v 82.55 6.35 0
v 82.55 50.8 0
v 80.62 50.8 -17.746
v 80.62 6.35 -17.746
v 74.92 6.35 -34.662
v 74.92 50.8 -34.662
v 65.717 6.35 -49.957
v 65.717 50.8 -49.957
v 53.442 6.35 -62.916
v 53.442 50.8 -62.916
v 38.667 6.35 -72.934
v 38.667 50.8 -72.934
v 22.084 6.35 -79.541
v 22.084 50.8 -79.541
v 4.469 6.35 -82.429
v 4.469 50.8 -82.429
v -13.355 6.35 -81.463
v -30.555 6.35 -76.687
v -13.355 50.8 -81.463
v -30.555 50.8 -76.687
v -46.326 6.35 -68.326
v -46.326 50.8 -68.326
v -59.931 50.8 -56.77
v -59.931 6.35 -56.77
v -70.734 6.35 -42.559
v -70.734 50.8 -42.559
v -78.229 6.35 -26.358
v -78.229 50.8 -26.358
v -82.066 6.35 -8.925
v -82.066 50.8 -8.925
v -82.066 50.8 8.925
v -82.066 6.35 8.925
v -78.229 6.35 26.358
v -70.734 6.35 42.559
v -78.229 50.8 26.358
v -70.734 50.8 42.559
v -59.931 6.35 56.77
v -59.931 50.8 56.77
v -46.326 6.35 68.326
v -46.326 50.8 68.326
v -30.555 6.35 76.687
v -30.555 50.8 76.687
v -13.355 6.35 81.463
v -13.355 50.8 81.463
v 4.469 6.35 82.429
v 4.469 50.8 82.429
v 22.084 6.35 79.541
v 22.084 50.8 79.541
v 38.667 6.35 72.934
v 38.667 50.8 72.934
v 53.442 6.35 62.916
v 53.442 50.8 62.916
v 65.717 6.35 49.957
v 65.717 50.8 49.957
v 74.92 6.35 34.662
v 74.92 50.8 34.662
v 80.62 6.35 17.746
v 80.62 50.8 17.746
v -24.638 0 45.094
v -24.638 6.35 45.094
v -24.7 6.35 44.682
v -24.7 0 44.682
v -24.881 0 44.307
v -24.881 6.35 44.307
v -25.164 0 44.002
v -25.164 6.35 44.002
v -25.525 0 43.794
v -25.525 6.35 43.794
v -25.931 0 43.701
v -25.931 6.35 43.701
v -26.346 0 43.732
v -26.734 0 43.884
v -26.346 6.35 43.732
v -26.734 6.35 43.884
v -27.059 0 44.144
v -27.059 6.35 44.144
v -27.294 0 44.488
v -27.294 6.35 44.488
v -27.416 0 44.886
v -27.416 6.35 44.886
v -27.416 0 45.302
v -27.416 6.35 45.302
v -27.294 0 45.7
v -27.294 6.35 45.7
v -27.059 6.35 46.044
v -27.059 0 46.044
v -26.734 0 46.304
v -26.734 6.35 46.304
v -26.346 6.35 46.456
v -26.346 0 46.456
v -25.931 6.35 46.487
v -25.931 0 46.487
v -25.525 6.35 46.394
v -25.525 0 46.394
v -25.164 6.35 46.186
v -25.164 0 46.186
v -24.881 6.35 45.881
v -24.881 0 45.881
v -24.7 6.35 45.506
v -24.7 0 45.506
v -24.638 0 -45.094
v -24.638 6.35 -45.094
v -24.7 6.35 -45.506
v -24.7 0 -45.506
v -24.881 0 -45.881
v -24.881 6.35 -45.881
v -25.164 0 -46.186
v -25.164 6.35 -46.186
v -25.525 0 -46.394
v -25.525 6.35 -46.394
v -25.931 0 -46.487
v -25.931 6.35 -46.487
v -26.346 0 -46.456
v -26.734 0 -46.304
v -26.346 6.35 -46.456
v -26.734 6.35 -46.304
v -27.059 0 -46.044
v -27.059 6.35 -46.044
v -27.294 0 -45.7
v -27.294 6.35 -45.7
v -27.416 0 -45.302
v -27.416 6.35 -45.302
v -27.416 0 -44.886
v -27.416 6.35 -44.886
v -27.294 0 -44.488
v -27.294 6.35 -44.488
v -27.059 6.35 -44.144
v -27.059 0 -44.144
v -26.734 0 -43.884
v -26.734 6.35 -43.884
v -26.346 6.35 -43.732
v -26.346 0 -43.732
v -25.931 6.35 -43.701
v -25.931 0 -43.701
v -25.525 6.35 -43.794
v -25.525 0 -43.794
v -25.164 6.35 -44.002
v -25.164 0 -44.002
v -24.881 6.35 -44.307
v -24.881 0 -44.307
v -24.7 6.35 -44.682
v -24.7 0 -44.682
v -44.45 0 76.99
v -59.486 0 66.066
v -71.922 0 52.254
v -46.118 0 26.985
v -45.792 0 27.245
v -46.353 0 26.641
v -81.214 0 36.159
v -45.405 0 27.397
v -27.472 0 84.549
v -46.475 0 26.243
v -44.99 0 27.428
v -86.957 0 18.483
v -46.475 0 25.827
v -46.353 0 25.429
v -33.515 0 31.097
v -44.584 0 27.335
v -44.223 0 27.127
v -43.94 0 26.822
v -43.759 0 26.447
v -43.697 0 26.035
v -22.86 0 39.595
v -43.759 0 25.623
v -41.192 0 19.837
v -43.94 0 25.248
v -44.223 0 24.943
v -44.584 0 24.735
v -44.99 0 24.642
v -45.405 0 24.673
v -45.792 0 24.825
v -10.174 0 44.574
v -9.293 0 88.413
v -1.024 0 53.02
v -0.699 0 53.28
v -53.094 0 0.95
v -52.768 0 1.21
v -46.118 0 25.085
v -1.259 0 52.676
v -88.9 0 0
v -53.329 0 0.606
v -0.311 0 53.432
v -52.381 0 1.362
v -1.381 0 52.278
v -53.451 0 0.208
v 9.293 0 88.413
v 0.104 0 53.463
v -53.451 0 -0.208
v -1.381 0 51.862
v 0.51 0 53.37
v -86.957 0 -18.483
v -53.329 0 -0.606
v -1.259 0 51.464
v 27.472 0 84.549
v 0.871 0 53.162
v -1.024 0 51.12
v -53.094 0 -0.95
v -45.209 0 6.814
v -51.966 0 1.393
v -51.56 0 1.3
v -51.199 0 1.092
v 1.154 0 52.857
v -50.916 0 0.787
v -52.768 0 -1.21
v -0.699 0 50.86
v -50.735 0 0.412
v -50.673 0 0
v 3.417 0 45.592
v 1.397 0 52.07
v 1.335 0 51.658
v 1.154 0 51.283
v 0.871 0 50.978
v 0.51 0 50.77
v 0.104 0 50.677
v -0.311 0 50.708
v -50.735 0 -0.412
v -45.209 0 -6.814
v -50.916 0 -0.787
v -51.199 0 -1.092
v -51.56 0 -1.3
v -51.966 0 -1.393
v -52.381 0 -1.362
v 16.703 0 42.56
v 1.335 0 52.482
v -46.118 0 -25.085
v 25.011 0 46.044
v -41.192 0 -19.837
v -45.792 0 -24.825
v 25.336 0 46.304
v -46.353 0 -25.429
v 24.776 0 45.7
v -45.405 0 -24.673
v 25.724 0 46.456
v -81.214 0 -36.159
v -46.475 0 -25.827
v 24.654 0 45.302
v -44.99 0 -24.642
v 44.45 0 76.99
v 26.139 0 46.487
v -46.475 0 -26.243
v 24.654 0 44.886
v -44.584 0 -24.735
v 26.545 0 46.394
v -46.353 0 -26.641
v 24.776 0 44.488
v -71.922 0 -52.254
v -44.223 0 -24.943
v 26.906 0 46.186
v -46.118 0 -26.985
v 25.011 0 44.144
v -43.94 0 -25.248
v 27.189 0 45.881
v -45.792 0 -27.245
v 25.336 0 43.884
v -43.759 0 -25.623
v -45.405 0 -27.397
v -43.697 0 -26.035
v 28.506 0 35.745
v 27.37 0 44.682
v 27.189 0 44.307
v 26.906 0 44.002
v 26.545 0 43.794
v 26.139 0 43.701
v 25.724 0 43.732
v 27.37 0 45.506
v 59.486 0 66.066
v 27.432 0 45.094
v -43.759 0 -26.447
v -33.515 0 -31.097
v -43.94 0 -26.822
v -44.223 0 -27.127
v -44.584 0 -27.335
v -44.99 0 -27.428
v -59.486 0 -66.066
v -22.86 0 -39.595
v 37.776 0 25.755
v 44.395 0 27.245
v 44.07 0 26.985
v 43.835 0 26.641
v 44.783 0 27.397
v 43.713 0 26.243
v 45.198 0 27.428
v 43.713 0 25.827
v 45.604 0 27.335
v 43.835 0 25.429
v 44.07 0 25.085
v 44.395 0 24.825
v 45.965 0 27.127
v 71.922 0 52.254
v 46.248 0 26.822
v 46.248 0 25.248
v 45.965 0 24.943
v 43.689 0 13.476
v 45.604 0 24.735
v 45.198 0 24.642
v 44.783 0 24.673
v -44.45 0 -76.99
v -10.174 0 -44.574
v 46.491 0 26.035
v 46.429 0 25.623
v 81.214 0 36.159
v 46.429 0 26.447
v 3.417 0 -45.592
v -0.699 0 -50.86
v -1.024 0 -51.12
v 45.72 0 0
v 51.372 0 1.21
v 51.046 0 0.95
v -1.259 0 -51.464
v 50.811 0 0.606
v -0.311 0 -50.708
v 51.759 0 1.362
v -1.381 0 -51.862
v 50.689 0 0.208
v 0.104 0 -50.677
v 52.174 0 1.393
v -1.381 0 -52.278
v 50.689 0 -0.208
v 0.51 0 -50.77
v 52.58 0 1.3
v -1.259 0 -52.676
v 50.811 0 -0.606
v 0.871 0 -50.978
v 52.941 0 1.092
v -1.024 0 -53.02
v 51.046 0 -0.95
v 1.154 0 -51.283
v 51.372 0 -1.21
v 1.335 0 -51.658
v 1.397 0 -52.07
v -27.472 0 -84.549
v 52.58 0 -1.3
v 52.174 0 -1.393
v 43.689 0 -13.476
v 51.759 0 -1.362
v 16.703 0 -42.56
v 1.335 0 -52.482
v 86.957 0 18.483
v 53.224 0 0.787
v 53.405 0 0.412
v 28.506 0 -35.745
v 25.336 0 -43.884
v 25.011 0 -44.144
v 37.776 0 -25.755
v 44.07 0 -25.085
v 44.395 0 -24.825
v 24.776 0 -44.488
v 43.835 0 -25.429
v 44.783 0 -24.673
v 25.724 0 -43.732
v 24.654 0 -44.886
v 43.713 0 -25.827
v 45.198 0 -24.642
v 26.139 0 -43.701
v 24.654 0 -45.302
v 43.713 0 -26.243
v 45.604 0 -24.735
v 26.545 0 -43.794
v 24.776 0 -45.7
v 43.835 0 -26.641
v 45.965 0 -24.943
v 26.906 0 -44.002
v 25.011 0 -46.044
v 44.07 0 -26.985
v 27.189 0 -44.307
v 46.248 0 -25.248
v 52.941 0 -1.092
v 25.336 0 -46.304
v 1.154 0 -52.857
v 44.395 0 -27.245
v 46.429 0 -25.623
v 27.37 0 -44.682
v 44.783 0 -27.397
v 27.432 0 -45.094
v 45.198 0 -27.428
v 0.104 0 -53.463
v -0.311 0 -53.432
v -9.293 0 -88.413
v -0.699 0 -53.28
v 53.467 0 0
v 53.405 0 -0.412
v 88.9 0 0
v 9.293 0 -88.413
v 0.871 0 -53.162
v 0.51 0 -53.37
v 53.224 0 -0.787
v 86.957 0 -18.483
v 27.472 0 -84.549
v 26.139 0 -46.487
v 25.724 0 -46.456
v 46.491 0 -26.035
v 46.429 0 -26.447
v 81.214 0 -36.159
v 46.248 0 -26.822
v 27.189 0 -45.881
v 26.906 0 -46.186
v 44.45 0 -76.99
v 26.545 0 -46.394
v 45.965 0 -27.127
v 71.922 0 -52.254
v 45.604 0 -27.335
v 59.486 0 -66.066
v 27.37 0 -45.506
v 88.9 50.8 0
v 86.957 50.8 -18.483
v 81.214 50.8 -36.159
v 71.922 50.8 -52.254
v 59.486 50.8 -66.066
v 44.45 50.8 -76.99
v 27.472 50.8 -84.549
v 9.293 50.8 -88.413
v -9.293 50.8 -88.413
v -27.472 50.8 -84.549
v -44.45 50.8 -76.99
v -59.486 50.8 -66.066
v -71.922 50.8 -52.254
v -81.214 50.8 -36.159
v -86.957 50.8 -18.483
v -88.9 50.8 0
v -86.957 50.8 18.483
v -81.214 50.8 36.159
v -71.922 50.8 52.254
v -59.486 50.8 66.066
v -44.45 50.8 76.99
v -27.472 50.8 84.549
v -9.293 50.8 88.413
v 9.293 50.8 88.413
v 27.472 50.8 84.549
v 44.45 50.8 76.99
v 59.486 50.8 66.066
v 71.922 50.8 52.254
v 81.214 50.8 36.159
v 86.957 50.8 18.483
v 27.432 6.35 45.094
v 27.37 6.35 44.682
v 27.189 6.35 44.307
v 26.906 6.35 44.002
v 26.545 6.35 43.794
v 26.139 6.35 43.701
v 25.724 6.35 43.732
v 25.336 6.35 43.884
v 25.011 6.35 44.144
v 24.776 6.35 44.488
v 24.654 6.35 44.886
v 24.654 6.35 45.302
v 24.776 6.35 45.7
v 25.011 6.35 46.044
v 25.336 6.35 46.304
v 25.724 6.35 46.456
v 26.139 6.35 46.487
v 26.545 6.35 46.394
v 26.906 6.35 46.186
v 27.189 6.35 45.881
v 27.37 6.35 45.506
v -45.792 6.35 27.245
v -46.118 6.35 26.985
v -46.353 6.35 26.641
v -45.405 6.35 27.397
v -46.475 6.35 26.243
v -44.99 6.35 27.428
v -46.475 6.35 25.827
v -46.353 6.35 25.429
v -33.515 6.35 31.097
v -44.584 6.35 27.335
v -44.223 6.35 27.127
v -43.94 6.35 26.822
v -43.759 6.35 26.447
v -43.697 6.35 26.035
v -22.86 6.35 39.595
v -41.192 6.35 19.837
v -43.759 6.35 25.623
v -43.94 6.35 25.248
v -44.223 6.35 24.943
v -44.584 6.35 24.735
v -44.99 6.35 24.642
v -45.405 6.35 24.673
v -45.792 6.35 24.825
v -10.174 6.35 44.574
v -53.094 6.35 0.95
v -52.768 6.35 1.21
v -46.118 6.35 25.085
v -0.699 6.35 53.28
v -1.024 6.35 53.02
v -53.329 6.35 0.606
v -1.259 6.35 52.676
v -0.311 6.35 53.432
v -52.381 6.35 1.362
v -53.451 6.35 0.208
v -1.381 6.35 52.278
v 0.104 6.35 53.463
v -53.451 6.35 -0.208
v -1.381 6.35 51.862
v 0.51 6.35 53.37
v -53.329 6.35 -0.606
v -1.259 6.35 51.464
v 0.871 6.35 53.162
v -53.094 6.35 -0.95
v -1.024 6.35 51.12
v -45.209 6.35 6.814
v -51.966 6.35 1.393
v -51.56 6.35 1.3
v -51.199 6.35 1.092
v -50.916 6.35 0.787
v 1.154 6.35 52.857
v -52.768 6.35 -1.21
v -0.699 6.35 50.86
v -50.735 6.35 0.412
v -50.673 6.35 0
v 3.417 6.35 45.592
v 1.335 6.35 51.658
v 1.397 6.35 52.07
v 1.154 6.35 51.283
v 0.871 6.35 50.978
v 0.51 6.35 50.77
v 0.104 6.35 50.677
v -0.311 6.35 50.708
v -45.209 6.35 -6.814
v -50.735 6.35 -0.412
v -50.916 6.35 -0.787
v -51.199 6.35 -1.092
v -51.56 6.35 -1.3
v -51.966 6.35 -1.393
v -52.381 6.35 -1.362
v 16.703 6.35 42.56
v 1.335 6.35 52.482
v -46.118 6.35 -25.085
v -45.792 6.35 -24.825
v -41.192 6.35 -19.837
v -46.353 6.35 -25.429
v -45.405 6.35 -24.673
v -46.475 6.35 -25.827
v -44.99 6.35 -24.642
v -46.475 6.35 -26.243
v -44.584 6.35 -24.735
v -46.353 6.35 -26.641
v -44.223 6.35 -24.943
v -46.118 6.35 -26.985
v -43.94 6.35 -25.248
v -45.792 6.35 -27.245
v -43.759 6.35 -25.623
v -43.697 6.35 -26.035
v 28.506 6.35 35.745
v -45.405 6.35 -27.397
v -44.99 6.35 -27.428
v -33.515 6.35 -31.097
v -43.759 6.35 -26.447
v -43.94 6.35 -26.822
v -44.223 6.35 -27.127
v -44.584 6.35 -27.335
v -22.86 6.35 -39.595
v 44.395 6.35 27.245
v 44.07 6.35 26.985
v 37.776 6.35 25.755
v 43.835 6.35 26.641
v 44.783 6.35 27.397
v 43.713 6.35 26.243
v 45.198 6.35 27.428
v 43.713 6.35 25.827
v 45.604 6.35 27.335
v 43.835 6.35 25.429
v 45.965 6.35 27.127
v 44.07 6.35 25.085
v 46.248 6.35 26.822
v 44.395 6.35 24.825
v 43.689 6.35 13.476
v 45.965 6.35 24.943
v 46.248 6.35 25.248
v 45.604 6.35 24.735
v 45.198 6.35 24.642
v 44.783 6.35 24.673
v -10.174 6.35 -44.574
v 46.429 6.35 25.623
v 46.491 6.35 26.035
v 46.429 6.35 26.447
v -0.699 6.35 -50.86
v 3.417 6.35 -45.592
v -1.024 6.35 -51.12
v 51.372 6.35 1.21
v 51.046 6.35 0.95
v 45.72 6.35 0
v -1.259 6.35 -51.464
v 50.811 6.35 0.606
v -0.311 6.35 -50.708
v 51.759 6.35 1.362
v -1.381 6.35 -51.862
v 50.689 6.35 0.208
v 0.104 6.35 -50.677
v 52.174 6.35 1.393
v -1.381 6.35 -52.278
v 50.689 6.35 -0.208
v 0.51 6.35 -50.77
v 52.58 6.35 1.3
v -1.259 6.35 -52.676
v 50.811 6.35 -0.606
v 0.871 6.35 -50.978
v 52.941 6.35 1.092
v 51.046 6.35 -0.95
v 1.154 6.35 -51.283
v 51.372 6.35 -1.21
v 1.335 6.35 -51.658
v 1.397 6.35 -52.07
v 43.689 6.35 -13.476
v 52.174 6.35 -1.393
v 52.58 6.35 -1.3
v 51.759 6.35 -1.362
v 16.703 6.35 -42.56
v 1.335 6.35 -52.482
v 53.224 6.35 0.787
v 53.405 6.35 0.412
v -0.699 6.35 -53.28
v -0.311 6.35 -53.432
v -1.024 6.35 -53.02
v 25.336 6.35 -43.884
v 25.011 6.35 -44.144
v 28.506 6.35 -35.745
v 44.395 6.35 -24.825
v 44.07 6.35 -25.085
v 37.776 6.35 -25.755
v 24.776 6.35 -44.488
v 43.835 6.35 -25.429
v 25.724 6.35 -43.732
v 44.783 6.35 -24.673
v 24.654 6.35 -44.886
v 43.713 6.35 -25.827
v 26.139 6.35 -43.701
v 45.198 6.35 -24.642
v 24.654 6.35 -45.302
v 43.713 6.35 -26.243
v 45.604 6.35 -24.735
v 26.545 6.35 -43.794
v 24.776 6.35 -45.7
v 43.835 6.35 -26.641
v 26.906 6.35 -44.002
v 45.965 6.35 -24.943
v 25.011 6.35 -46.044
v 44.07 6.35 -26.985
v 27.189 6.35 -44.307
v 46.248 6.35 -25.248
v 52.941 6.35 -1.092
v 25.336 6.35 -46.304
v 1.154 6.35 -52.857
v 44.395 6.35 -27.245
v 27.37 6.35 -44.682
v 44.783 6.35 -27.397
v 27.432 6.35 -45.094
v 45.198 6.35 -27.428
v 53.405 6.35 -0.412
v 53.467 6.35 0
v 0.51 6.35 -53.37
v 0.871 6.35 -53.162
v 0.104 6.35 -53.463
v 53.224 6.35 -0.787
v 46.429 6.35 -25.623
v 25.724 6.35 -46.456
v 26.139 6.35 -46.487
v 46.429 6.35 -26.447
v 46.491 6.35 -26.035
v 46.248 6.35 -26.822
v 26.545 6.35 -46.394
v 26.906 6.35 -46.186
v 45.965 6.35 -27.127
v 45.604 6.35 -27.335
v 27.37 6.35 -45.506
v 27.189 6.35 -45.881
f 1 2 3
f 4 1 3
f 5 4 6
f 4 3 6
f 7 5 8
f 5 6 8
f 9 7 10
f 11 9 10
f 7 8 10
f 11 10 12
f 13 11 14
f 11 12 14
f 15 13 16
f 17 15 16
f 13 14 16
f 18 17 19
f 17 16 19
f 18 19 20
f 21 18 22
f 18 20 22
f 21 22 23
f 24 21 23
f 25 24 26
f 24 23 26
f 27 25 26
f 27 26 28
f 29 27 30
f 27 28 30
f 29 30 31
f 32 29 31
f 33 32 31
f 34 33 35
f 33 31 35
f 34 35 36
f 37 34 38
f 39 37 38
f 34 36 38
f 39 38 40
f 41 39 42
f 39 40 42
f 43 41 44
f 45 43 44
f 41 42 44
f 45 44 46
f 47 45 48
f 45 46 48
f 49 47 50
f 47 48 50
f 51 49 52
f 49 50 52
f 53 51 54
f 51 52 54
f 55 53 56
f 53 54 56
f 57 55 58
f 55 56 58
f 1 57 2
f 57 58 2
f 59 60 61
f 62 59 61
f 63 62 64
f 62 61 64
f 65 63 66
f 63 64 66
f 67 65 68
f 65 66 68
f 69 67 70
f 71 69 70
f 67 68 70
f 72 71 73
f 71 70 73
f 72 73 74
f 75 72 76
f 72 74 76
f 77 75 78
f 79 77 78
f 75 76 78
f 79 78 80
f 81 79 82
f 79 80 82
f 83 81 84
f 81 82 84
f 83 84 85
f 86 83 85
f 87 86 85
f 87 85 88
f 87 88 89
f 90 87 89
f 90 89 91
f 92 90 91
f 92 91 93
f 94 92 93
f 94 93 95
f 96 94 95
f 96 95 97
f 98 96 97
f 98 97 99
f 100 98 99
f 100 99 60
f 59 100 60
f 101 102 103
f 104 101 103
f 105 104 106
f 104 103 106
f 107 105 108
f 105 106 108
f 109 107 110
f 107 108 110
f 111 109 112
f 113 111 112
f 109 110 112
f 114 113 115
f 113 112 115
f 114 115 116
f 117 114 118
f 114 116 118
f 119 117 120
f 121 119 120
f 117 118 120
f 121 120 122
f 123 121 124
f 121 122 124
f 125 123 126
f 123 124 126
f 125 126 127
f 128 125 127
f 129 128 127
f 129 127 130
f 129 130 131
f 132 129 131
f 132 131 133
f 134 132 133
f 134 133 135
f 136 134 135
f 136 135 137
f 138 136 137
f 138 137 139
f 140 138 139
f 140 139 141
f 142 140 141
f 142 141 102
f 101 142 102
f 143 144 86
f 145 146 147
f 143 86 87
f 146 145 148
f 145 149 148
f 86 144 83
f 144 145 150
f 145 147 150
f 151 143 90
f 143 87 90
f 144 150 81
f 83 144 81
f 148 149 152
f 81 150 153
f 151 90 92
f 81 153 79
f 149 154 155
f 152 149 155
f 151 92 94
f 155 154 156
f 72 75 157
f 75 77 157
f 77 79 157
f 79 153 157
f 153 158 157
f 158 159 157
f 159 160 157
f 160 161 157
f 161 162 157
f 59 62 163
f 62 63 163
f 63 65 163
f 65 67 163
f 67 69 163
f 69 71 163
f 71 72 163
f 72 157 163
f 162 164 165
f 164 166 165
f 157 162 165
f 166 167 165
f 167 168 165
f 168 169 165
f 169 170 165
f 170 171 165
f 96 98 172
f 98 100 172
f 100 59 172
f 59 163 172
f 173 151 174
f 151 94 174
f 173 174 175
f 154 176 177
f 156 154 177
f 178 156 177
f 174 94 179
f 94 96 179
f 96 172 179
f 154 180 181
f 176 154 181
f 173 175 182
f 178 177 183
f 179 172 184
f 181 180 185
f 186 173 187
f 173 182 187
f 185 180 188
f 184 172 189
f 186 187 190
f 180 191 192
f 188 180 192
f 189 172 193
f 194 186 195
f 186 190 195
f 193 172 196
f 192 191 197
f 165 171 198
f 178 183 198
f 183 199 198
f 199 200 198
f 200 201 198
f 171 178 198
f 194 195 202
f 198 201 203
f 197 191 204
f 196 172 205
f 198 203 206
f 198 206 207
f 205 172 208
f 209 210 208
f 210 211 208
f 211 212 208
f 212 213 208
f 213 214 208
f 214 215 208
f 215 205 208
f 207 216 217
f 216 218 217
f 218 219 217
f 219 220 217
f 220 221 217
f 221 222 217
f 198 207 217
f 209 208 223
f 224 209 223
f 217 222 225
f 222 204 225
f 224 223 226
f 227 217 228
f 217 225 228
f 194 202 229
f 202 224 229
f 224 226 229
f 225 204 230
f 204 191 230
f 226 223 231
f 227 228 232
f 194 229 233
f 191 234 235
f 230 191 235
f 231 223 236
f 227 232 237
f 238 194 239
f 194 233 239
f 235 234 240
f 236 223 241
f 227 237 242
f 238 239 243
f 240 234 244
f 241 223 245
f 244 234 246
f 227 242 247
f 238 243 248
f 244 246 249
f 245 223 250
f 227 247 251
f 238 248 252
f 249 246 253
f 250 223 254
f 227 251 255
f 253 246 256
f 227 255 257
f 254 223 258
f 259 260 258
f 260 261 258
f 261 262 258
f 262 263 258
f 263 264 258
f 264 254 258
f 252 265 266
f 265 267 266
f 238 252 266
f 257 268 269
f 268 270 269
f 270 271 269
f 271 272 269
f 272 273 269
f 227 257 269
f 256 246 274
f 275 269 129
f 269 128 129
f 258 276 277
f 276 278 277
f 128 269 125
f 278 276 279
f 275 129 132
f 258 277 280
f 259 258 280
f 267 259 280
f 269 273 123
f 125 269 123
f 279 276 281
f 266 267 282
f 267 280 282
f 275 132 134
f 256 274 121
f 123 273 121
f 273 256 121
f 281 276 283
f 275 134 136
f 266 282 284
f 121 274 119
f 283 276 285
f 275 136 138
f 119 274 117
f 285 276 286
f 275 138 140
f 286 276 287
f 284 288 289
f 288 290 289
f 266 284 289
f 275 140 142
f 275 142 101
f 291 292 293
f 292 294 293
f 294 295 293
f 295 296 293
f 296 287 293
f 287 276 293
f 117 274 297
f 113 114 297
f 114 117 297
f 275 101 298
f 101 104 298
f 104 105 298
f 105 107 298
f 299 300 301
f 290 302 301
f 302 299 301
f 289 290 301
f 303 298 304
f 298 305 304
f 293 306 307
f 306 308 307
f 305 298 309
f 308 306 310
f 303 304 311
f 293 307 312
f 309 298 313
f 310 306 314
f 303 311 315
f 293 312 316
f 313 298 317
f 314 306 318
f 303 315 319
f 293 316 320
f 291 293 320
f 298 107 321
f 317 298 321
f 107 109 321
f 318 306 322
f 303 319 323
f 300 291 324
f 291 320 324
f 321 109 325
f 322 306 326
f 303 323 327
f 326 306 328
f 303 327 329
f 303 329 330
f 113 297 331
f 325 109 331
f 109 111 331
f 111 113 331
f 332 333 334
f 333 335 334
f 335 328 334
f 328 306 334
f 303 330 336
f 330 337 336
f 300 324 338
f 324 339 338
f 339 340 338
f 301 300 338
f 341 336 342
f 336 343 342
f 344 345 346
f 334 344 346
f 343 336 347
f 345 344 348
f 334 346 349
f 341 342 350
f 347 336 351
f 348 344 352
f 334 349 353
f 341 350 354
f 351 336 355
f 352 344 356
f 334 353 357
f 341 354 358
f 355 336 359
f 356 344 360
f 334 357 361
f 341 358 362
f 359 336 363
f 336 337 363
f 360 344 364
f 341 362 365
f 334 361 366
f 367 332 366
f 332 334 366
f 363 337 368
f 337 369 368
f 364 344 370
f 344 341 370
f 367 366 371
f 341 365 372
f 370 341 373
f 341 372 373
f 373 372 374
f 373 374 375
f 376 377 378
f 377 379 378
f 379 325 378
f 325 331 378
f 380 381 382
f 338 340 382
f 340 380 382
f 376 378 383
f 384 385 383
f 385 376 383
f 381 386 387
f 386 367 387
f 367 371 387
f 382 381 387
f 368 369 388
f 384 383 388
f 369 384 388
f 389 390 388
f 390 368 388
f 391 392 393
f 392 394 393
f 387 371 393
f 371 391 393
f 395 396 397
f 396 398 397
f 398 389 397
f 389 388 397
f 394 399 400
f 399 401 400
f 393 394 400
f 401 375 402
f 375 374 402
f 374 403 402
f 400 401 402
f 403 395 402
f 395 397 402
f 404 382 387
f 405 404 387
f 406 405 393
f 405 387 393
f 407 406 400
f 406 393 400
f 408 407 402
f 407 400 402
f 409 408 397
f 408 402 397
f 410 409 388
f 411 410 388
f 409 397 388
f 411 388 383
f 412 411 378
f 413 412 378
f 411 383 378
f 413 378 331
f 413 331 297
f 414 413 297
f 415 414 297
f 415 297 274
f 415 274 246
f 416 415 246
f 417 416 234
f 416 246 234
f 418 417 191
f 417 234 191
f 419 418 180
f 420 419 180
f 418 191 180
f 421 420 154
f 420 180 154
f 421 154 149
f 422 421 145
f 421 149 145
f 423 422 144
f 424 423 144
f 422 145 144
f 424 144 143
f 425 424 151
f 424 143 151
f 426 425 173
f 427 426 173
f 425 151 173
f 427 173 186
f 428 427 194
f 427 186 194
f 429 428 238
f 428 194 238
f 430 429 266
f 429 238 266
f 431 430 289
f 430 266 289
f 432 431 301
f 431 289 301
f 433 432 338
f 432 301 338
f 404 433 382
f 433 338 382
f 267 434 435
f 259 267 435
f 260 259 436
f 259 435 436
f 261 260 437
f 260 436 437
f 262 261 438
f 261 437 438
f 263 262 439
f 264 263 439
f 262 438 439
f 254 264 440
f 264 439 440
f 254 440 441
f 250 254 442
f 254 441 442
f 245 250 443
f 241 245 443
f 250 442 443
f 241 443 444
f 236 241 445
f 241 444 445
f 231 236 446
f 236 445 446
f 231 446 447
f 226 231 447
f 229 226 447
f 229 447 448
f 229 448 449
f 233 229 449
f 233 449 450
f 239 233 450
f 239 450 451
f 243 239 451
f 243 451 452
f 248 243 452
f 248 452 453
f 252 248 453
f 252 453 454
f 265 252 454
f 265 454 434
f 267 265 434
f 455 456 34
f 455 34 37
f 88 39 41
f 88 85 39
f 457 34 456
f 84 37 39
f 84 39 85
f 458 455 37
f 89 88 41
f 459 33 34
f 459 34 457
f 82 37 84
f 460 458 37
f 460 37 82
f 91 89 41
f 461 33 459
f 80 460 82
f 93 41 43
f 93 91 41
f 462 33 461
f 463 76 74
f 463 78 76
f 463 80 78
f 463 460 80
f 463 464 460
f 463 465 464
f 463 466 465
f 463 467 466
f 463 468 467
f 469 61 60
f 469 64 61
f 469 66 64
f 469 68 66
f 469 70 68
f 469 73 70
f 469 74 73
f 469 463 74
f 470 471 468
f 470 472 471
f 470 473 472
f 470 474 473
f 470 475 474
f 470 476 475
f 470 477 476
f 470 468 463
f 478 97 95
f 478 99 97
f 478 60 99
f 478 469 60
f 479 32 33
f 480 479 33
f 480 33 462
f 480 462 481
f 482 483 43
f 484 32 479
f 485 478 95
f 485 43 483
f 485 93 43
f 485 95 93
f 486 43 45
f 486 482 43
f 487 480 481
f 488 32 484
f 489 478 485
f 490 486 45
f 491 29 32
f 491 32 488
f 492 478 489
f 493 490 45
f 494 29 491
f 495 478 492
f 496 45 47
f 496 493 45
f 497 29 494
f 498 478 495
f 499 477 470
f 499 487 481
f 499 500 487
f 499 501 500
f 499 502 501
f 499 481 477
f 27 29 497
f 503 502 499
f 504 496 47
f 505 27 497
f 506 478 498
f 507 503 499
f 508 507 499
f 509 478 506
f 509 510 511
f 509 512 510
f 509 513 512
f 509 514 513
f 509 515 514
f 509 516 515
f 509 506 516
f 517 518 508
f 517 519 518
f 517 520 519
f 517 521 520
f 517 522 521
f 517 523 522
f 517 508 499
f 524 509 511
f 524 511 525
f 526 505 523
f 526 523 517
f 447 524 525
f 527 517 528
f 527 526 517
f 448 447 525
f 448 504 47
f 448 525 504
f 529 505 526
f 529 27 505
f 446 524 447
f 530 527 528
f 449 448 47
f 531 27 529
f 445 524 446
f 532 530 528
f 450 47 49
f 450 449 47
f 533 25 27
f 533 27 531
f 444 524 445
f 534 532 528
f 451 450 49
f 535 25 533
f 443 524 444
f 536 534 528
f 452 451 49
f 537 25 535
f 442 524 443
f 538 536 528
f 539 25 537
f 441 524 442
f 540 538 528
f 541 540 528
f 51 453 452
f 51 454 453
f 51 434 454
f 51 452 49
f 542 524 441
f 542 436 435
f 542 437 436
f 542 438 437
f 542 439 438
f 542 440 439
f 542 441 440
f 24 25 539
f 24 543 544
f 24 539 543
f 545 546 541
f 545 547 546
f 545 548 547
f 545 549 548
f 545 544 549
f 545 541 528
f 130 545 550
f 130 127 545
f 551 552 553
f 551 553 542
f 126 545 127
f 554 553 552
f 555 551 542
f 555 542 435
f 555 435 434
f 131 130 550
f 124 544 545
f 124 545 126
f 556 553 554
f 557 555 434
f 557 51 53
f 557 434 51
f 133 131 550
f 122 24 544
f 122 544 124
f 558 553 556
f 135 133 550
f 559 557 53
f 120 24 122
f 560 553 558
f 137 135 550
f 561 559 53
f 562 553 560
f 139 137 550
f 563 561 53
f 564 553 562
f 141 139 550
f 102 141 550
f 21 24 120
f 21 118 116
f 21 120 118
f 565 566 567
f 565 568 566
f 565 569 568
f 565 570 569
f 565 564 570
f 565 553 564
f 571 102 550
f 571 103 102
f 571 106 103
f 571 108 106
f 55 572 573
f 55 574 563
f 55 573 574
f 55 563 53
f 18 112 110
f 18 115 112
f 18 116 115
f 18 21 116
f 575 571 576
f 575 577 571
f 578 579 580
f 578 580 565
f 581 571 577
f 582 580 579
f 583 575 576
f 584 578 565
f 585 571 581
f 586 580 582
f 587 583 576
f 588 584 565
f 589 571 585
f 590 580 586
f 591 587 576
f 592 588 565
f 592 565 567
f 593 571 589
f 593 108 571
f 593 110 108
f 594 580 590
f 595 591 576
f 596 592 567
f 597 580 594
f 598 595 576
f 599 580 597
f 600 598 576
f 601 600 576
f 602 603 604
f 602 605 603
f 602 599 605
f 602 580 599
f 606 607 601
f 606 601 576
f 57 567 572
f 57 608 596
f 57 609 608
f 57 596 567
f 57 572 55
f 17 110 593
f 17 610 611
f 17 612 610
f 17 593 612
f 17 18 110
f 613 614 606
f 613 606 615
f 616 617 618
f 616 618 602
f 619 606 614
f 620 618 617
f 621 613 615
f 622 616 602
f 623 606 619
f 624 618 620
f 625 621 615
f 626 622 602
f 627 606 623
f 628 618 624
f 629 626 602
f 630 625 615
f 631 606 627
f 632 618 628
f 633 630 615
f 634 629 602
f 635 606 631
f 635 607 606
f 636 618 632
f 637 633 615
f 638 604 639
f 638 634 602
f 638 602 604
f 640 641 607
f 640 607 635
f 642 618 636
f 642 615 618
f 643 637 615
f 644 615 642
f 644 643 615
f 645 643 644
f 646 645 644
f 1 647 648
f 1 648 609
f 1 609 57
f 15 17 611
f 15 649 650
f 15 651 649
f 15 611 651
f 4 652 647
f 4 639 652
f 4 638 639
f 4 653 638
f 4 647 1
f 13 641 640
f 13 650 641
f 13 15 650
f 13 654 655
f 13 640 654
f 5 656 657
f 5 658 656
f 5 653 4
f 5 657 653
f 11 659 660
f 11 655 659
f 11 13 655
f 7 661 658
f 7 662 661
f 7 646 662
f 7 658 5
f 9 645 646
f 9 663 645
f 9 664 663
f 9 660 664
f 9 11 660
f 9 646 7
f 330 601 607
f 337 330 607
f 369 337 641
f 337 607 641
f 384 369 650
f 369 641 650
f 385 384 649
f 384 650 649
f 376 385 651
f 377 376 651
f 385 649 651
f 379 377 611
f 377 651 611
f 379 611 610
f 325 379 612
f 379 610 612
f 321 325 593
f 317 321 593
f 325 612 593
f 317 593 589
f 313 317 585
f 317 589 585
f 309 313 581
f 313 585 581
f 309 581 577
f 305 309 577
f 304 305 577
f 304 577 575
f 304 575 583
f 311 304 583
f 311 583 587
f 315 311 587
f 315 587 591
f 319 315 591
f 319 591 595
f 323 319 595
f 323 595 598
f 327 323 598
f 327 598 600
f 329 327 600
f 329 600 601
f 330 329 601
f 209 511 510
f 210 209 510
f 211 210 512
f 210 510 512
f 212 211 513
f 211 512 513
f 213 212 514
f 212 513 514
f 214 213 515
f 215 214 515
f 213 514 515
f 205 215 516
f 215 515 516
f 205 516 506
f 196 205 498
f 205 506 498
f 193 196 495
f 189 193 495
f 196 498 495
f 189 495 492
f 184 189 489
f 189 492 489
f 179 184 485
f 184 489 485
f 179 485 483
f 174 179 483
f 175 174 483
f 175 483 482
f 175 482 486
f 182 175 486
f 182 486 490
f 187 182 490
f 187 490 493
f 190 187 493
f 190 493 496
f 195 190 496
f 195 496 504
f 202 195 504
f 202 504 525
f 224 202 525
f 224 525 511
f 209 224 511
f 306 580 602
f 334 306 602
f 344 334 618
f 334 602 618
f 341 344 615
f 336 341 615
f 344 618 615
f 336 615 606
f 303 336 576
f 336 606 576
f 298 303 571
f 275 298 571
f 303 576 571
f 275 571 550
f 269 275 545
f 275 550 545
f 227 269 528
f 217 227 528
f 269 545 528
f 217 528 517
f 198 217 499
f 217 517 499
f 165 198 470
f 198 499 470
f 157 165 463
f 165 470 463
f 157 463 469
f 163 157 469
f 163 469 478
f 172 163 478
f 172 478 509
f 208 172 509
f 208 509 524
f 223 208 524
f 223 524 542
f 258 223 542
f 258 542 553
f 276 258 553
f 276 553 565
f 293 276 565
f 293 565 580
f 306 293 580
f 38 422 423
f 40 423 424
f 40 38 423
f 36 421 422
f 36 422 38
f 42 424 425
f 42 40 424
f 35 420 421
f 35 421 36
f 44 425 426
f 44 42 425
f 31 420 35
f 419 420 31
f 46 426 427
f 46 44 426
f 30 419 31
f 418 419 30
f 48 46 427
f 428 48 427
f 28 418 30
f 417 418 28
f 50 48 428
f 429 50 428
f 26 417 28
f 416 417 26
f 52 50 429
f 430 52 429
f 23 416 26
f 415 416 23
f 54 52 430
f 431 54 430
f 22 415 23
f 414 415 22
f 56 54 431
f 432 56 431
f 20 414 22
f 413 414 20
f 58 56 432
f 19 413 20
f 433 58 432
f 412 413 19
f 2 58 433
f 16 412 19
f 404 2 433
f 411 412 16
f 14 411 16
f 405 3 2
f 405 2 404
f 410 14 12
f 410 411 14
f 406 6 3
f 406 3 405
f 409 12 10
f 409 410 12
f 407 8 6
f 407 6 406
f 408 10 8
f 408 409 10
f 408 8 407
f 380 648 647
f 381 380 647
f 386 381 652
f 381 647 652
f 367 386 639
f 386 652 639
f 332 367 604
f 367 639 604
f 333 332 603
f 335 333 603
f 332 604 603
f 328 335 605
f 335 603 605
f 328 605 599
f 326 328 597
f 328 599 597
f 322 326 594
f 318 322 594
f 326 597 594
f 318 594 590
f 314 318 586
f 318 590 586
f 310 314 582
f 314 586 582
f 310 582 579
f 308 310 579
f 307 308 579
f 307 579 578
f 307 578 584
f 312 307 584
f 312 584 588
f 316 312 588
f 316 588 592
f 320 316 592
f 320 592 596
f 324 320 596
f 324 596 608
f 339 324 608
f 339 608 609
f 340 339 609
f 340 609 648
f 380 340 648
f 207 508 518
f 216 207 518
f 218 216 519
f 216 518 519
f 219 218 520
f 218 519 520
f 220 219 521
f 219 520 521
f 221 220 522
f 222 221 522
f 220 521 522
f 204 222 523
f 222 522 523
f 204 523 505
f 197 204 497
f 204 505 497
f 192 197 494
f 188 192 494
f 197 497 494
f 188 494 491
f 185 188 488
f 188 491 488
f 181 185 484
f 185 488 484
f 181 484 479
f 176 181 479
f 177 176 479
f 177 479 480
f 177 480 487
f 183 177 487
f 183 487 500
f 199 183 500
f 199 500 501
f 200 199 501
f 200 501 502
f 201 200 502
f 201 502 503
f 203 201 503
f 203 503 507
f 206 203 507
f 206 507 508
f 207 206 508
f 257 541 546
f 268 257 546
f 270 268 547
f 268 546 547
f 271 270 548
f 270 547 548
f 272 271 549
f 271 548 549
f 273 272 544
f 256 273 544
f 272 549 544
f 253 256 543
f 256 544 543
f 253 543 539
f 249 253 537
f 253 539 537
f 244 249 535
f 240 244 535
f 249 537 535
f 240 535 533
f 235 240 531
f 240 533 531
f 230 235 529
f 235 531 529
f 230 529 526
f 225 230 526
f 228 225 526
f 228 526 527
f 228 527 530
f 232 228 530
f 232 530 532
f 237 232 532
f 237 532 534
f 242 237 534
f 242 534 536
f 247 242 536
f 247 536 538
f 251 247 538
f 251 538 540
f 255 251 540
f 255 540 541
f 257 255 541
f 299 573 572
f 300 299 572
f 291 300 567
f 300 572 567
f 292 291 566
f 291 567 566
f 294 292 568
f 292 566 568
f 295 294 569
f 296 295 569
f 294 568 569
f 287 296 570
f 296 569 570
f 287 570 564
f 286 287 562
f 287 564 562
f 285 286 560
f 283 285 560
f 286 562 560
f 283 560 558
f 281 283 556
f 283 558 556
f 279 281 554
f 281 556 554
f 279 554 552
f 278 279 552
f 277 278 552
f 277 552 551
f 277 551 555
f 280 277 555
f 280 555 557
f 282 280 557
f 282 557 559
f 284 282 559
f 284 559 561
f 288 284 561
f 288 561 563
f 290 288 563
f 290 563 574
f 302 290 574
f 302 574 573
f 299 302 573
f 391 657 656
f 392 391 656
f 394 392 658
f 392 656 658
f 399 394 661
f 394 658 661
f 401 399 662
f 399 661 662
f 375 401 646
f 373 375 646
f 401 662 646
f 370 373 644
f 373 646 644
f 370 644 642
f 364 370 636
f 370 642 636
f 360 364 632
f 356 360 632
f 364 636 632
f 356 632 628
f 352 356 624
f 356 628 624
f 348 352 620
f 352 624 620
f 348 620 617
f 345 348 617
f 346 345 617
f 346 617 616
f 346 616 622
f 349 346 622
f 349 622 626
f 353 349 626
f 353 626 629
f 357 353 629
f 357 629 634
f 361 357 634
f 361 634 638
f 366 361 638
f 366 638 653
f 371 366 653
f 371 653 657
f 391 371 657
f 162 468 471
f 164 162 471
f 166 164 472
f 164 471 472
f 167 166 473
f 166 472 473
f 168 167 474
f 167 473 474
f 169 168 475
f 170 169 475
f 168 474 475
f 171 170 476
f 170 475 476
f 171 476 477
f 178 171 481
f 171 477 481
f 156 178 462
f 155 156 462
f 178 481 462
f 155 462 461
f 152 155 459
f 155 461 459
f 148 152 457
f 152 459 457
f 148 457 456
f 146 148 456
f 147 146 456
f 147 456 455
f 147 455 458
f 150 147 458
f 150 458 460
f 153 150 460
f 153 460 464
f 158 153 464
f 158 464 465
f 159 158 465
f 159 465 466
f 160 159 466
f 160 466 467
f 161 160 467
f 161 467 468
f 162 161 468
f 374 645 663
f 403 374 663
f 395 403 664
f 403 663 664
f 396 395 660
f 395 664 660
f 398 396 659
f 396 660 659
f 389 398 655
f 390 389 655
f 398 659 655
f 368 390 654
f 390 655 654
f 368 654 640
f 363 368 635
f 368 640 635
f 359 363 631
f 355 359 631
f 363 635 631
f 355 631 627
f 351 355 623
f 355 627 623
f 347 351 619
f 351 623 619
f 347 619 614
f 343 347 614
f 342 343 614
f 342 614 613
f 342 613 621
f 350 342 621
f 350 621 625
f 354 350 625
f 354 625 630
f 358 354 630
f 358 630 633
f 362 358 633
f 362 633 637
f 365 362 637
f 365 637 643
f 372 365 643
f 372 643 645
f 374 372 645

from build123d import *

# Parameters (mm, degrees)
SKETCH1_R           = 88.9
BOSS_EXTRUDE1_DEPTH = 50.8
SKETCH2_R           = 82.55
CUT_EXTRUDE1_DEPTH  = 44.45
SKETCH3_R           = 45.72
SKETCH3_R_2         = 1.397
CUT_EXTRUDE2_DEPTH  = 7.35


with BuildPart() as part:
    # Sketch1 → Boss-Extrude1 (new body)
    with BuildSketch(Plane(origin=(0, 0, 0), x_dir=(1, 0, 0), z_dir=(0, 1, 0))):
        Circle(SKETCH1_R)
    extrude(amount=BOSS_EXTRUDE1_DEPTH)

    # Sketch2 → Cut-Extrude1 (cut)
    with BuildSketch(Plane(origin=(0, 50.8, 0), x_dir=(1, 0, 0), z_dir=(0, 1, 0))):
        Circle(SKETCH2_R)
    extrude(amount=-CUT_EXTRUDE1_DEPTH, mode=Mode.SUBTRACT)

    # Sketch3 → Cut-Extrude2 (cut, through all)
    with BuildSketch(Plane(origin=(0, 6.35, 0), x_dir=(1, 0, 0), z_dir=(0, 1, 0))):
        Circle(SKETCH3_R)
        with Locations((0, 52.07)):
            Circle(SKETCH3_R_2)
        with Locations((26.035, 45.093942775)):
            Circle(SKETCH3_R_2)
        with Locations((45.093942775, 26.035)):
            Circle(SKETCH3_R_2)
        with Locations((52.07, 0)):
            Circle(SKETCH3_R_2)
        with Locations((45.093942775, -26.035)):
            Circle(SKETCH3_R_2)
        with Locations((26.035, -45.093942775)):
            Circle(SKETCH3_R_2)
        with Locations((0, -52.07)):
            Circle(SKETCH3_R_2)
        with Locations((-26.035, -45.093942775)):
            Circle(SKETCH3_R_2)
        with Locations((-45.093942775, -26.035)):
            Circle(SKETCH3_R_2)
        with Locations((-52.07, 0)):
            Circle(SKETCH3_R_2)
        with Locations((-45.093942775, 26.035)):
            Circle(SKETCH3_R_2)
        with Locations((-26.035, 45.093942775)):
            Circle(SKETCH3_R_2)
    extrude(amount=-CUT_EXTRUDE2_DEPTH, mode=Mode.SUBTRACT)


solid = part.part
